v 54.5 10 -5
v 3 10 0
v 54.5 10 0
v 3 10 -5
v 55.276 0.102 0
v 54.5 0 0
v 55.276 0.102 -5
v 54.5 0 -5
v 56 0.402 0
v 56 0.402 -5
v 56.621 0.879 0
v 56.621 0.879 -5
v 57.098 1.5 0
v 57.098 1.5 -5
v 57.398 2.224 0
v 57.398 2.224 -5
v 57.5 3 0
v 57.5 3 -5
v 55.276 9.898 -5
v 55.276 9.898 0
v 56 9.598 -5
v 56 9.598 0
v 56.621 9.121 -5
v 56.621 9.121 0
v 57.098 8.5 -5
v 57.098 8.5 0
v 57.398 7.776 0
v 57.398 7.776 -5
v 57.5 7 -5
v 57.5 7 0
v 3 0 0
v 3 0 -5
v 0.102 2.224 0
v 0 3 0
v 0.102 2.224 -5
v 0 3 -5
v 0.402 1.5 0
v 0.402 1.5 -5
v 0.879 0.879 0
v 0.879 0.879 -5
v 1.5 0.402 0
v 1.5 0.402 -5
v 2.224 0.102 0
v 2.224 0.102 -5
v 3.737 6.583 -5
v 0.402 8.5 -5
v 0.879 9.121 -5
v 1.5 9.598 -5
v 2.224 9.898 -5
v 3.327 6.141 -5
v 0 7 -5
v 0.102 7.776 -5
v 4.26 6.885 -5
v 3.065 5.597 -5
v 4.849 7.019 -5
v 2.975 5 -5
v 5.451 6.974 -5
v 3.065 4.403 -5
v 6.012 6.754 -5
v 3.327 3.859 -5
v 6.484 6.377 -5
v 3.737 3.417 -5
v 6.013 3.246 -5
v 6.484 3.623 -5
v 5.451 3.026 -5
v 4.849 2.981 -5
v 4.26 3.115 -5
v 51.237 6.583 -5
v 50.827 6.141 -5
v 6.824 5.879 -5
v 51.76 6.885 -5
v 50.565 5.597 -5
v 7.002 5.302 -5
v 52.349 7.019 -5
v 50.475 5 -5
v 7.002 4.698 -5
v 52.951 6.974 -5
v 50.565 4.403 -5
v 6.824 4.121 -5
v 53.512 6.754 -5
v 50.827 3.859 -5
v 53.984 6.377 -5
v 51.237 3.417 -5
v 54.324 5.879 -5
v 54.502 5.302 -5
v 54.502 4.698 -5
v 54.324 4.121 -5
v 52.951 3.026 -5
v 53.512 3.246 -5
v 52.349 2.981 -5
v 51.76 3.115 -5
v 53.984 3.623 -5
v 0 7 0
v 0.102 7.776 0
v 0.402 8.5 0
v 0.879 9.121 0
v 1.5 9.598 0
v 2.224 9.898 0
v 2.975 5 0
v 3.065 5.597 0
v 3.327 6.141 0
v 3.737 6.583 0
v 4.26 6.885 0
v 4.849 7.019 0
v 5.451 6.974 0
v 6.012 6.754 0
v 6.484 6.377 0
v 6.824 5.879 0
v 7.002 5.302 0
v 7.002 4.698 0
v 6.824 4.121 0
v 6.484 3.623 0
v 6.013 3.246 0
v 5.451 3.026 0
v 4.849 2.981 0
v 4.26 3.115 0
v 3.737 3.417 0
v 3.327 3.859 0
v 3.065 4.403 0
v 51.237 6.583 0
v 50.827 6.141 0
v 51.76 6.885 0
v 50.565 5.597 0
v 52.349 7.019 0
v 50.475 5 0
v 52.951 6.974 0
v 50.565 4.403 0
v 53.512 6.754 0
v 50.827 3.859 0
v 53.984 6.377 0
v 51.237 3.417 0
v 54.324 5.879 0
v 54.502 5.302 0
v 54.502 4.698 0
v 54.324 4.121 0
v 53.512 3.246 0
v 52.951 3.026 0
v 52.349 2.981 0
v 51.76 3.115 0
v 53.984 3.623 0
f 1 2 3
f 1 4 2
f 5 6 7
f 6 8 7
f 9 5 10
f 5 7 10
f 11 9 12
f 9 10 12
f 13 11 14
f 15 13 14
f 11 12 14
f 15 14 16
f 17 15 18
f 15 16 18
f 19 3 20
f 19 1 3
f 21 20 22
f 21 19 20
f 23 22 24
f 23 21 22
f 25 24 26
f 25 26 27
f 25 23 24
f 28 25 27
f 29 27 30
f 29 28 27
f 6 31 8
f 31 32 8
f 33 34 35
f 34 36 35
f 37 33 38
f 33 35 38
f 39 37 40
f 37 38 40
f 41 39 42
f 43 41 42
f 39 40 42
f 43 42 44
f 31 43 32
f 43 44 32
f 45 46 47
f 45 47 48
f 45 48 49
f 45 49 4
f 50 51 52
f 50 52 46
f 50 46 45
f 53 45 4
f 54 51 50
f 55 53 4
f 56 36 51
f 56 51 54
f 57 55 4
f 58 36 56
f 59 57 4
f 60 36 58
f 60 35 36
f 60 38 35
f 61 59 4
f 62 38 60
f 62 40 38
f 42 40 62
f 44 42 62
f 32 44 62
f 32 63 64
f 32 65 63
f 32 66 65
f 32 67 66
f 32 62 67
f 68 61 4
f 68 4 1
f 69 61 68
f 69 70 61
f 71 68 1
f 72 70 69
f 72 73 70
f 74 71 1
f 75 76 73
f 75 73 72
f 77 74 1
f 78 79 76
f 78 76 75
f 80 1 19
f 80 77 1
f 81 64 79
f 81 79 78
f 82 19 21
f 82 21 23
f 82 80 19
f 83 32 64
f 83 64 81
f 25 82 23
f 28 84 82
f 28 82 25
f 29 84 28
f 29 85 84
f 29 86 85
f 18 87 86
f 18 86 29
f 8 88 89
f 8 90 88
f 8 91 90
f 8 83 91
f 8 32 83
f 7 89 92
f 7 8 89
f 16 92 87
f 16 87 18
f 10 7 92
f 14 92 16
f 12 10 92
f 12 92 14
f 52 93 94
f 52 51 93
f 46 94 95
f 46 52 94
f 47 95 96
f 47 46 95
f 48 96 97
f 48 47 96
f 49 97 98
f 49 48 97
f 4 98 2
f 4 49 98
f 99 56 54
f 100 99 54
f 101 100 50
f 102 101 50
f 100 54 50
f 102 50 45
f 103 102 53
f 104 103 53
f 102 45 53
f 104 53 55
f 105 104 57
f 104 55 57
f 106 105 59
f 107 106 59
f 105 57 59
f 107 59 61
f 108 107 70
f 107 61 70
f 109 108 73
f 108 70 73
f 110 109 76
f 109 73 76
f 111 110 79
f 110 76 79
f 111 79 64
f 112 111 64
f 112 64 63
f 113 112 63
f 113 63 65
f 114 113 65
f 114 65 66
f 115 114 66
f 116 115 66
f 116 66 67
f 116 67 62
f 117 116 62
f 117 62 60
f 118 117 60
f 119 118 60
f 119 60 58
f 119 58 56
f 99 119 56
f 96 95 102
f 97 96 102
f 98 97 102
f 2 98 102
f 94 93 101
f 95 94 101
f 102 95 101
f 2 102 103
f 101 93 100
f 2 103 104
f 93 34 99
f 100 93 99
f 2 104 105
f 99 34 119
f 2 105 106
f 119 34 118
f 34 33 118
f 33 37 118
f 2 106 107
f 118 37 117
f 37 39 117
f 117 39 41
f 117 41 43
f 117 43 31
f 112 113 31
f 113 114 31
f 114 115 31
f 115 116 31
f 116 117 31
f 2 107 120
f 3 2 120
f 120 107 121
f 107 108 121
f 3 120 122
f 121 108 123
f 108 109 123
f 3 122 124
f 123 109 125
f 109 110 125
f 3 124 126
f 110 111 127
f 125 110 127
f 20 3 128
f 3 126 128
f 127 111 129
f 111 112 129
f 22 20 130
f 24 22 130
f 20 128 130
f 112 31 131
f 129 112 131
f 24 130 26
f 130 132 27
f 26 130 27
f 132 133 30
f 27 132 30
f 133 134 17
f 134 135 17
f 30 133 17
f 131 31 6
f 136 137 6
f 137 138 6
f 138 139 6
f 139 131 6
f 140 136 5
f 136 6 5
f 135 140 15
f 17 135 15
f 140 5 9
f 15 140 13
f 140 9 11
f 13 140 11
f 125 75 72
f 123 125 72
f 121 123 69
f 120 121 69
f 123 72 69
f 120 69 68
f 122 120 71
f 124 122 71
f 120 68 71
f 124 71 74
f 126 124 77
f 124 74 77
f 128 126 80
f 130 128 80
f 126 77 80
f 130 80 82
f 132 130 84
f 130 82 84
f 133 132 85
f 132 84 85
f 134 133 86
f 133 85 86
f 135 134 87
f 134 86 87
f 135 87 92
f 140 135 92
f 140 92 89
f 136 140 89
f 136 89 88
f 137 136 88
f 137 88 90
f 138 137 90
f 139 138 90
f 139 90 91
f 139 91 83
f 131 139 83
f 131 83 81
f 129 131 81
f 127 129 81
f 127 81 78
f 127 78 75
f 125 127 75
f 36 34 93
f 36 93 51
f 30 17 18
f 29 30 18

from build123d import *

# Parameters (mm, degrees)
SKETCH_5_W          = 57.5
SKETCH_5_H          = 5
EXTRUDE_3_DEPTH     = 10
SKETCH_6_R          = 2.025
CUT_EXTRUDE_4_DEPTH = 59.576872569
FILLET_4_R          = 3


with BuildPart() as part:
    # 草图5 → 凸台-拉伸3 (new body)
    with BuildSketch(Plane(origin=(0, 0, 0), x_dir=(1, 0, 0), z_dir=(0, 1, 0))):
        with Locations((28.75, 2.5)):
            Rectangle(SKETCH_5_W, SKETCH_5_H)
    extrude(amount=EXTRUDE_3_DEPTH)

    # 草图6 → 切除-拉伸4 (cut, through all)
    with BuildSketch(Plane(origin=(0, 0, -5), x_dir=(-1, 0, 0), z_dir=(0, 0, -1))):
        with Locations((-52.5, 5)):
            Circle(SKETCH_6_R)
        with Locations((-5, 5)):
            Circle(SKETCH_6_R)
    extrude(amount=-CUT_EXTRUDE_4_DEPTH, mode=Mode.SUBTRACT)

    # 圆角4
    fillet_4_edges = [part.edges().sort_by_distance(p)[0] for p in [
        (57.5, 10, -2.5),
        (0, 10, -2.5),
        (57.5, 0, -2.5),
        (0, 0, -2.5),
    ]]
    fillet(fillet_4_edges, radius=FILLET_4_R)


solid = part.part
